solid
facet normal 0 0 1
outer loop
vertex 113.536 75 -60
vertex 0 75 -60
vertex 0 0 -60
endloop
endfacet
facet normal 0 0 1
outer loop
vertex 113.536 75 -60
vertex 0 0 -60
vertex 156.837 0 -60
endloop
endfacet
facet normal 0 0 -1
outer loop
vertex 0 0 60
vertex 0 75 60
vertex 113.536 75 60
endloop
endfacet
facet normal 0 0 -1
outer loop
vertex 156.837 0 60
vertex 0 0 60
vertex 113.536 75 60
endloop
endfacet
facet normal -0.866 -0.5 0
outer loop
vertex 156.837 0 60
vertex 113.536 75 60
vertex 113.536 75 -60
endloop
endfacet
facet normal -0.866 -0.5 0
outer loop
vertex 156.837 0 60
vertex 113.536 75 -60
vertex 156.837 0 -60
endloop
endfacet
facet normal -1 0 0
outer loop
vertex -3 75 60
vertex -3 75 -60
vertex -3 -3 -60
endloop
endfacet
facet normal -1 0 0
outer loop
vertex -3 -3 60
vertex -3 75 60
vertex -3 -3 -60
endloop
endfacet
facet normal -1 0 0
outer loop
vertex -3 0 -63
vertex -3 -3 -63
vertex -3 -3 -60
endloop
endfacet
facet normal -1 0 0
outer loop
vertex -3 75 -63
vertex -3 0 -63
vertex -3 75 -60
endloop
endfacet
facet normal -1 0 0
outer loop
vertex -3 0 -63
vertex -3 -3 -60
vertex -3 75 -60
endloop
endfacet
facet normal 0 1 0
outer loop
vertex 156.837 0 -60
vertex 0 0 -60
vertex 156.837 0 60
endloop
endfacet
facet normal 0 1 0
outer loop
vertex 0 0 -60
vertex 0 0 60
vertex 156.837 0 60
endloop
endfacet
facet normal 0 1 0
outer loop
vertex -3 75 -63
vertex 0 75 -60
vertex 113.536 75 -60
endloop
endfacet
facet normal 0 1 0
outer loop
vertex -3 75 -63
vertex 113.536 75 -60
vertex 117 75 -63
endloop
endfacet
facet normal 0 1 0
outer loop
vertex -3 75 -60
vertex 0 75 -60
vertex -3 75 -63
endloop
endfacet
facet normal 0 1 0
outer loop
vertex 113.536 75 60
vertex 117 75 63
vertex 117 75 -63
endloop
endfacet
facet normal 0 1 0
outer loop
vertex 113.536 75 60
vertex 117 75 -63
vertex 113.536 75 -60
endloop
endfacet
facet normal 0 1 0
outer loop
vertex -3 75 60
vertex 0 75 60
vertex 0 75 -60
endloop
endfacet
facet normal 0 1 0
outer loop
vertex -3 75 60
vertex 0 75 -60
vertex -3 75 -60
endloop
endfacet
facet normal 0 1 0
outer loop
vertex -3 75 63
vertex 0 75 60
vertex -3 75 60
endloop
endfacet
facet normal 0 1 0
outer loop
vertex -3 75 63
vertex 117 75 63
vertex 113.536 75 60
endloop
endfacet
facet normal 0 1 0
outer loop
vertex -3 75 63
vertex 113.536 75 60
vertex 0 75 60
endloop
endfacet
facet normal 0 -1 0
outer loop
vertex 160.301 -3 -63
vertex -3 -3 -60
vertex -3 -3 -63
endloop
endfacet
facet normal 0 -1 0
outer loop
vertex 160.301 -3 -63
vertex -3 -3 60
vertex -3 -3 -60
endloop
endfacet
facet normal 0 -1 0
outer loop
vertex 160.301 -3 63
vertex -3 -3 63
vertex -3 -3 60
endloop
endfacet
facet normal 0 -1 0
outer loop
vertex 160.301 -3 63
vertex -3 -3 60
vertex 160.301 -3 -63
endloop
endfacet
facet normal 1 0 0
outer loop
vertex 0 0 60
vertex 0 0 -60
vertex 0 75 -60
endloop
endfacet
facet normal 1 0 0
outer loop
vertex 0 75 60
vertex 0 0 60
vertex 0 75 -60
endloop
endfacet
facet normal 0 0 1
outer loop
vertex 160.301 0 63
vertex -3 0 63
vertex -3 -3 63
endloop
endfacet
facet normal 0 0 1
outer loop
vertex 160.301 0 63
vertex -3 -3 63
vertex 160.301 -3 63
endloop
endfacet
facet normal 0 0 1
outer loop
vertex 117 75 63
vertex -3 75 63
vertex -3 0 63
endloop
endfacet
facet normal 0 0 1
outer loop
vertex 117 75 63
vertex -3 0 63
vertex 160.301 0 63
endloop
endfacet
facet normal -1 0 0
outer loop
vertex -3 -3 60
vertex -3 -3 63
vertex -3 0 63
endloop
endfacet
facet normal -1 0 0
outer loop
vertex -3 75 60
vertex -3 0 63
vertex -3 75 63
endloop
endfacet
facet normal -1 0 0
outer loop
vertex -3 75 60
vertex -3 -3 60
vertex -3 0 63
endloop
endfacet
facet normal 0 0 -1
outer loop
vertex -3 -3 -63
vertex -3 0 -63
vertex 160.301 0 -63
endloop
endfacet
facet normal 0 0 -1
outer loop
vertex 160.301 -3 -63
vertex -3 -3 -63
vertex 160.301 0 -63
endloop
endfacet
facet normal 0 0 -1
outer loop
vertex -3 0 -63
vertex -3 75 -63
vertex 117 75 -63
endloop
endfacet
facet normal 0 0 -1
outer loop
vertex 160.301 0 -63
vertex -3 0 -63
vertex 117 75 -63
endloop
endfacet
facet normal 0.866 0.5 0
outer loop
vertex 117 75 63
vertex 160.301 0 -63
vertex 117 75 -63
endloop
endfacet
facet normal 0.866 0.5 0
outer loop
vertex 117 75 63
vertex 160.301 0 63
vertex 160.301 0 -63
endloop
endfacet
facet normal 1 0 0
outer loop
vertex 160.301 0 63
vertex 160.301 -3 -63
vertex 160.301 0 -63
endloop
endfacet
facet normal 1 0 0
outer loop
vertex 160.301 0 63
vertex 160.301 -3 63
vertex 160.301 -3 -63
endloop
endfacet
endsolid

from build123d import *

# Parameters (mm, degrees)
SKETCH2_W           = 3
SKETCH2_H           = 75
SKETCH2_W_2         = 163.301270189
SKETCH2_H_2         = 3
BOSS_EXTRUDE3_DEPTH = 60
BOSS_EXTRUDE4_START = 60
SKETCH2_3_W         = 163.301270189
SKETCH2_3_H         = 3
SKETCH2_3_W_2       = 3
SKETCH2_3_H_2       = 75
BOSS_EXTRUDE4_DEPTH = 3


with BuildPart() as part:
    # Sketch2 → Boss-Extrude3 (new body)
    with BuildSketch(Plane.XY):
        with Locations((-1.5, 37.5)):
            Rectangle(SKETCH2_W, SKETCH2_H)
        Polygon((156.837168574, 0), (160.301270189, 0), (117, 75), (113.535898385, 75), align=None)
        with Locations((78.650635095, -1.5)):
            Rectangle(SKETCH2_W_2, SKETCH2_H_2)
    extrude(amount=BOSS_EXTRUDE3_DEPTH)

    # Sketch2<3> → Boss-Extrude4 (add)
    with BuildSketch(Plane.XY.offset(BOSS_EXTRUDE4_START)):
        Polygon((156.837168574, 0), (160.301270189, 0), (117, 75), (113.535898385, 75), align=None)
        with Locations((78.650635095, -1.5)):
            Rectangle(SKETCH2_3_W, SKETCH2_3_H)
        Polygon((0, 0), (156.837168574, 0), (113.535898385, 75), (0, 75), align=None)
        with Locations((-1.5, 37.5)):
            Rectangle(SKETCH2_3_W_2, SKETCH2_3_H_2)
    extrude(amount=BOSS_EXTRUDE4_DEPTH)

    # Mirror2: part across plane


with BuildPart() as part_1:
    add(part.part)
    add(part.part.mirror(Plane.XY))


solid = part_1.part
